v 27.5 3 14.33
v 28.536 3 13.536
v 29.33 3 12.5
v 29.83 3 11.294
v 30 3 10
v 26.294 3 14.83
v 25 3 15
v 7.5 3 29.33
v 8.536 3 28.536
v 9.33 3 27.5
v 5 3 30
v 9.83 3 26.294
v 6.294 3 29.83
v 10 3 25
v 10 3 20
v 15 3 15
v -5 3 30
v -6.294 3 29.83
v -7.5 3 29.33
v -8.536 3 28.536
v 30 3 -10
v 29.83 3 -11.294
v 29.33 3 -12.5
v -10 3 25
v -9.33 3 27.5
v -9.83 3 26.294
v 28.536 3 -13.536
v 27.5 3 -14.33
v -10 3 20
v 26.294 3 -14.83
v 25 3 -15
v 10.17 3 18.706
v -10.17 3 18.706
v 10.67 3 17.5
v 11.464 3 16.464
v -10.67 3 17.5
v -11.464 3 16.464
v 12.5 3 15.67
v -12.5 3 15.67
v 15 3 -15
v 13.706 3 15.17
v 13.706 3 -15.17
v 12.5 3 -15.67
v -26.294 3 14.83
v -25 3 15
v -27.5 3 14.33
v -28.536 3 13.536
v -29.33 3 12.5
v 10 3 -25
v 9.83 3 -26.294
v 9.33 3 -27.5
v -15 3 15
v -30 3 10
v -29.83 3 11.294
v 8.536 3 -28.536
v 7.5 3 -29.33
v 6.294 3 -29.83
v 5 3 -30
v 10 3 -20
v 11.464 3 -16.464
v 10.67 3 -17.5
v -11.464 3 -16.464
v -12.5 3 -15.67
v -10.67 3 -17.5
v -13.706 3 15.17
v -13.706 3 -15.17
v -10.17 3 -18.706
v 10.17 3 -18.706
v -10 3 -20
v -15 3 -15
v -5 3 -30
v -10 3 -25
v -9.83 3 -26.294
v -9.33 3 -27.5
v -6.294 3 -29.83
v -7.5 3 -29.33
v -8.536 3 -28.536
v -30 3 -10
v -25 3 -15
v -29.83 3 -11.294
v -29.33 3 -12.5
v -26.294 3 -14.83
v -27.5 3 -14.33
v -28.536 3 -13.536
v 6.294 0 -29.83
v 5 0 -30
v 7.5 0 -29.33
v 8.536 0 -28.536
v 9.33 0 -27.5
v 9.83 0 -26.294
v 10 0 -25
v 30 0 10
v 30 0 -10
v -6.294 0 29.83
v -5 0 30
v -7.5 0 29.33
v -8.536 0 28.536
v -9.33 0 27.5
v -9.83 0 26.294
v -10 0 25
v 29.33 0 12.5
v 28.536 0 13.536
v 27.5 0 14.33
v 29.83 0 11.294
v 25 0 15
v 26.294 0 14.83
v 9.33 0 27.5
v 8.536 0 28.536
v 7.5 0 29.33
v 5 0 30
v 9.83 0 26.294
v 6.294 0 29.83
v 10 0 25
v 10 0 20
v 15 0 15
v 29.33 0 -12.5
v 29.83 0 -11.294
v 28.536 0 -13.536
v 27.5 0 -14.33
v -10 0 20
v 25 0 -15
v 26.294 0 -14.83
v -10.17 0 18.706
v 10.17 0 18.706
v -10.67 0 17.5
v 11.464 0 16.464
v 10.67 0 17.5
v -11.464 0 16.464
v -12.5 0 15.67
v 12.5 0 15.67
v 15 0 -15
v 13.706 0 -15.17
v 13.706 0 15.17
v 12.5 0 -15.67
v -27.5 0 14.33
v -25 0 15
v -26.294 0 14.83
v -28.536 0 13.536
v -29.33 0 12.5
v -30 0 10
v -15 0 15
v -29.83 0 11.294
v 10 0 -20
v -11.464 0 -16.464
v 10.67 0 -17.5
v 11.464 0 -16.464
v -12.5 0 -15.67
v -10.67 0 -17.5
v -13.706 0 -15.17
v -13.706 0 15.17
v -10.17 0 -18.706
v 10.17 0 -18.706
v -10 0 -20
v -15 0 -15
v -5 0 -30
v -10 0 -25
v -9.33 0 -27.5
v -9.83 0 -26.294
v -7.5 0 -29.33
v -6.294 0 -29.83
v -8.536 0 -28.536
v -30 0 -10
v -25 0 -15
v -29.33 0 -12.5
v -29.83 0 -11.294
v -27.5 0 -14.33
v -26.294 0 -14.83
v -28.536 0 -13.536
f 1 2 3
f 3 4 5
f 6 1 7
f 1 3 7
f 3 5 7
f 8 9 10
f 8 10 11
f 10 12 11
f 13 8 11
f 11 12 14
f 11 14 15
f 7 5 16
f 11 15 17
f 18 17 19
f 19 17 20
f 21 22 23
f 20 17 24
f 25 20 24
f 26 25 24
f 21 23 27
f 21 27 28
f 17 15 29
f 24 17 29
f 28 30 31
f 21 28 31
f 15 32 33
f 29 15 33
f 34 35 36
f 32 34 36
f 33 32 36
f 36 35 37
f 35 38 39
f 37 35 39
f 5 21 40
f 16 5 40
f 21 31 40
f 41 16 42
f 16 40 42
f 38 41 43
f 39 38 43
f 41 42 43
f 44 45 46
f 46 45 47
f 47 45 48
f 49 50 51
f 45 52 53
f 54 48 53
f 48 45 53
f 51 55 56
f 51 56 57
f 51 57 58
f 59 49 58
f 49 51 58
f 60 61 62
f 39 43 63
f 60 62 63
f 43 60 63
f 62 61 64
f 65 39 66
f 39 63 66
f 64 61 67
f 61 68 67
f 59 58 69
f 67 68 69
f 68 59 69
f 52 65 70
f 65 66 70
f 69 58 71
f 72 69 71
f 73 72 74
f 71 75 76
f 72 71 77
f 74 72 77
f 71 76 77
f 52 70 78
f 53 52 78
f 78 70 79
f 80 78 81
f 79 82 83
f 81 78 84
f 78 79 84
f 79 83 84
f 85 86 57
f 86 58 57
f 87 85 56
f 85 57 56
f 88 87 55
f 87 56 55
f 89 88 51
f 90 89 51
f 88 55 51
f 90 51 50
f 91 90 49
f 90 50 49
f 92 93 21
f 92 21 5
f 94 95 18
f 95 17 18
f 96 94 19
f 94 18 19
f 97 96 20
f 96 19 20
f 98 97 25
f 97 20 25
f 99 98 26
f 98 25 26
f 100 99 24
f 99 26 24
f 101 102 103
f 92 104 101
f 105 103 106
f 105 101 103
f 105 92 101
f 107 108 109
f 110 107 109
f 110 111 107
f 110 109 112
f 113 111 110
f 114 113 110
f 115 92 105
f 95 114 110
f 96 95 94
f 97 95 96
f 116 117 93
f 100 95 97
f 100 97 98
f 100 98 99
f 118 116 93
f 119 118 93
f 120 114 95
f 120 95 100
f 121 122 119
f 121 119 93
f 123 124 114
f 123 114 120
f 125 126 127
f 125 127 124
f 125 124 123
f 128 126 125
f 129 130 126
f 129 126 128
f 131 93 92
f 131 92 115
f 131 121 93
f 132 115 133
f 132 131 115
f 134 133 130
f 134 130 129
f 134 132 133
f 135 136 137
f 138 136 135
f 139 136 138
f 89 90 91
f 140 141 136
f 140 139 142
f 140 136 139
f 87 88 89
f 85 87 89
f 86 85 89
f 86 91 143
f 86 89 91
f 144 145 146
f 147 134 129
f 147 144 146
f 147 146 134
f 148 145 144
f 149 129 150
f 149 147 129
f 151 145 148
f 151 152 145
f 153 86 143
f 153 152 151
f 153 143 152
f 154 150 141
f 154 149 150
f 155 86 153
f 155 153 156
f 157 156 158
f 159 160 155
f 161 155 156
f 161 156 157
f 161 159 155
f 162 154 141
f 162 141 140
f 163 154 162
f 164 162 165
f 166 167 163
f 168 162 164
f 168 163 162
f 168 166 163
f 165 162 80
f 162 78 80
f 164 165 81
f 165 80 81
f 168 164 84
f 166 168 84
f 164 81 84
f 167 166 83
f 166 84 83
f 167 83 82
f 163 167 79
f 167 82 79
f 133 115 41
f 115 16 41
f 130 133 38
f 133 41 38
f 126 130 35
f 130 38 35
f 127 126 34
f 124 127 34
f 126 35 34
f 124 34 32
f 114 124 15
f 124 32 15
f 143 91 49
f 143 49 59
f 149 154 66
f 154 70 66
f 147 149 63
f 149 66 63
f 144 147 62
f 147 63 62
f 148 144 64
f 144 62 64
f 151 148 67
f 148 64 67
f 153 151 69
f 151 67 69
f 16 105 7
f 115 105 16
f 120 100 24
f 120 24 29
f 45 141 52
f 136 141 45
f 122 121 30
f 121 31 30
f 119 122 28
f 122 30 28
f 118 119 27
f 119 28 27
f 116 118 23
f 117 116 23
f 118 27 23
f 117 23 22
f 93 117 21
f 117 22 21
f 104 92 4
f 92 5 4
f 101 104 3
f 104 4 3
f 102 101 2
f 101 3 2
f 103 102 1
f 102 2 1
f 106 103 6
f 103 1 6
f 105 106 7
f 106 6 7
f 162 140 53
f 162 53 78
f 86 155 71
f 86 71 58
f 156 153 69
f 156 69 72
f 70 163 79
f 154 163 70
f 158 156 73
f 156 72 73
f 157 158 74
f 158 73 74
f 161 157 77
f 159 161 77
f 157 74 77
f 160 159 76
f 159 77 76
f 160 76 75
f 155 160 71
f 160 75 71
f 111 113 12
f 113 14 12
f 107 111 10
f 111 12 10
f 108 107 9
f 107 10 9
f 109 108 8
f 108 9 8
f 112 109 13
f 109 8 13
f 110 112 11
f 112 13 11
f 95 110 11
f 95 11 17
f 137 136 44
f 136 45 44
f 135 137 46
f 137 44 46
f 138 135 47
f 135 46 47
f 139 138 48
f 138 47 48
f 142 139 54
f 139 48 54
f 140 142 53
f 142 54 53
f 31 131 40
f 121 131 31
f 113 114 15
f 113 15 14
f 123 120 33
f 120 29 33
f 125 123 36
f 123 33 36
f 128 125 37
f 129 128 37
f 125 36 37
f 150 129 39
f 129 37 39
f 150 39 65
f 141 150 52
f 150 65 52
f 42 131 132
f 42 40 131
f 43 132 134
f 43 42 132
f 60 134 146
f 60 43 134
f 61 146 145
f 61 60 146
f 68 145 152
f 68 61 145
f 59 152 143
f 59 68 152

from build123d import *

# Parameters (mm, degrees)
EXTRUDE_1_DEPTH = 3
FILLET_1_R      = 5


with BuildPart() as part:
    # 草图1 → 凸台-拉伸1 (new body)
    with BuildSketch(Plane(origin=(0, 0, 0), x_dir=(1, 0, 0), z_dir=(0, 1, 0))):
        Polygon((10, 15), (30, 15), (30, -15), (10, -15), (10, -30), (-10, -30), (-10, -15), (-30, -15), (-30, 15), (-10, 15), (-10, 30), (10, 30), align=None)
    extrude(amount=EXTRUDE_1_DEPTH)

    # 圆角1
    fillet_1_edges = [part.edges().sort_by_distance(p)[0] for p in [
        (10, 1.5, 30),
        (-10, 1.5, 30),
        (-10, 1.5, 15),
        (-30, 1.5, 15),
        (-30, 1.5, -15),
        (-10, 1.5, -15),
        (-10, 1.5, -30),
        (10, 1.5, -30),
        (10, 1.5, -15),
        (30, 1.5, -15),
        (30, 1.5, 15),
        (10, 1.5, 15),
    ]]
    fillet(fillet_1_edges, radius=FILLET_1_R)


solid = part.part
